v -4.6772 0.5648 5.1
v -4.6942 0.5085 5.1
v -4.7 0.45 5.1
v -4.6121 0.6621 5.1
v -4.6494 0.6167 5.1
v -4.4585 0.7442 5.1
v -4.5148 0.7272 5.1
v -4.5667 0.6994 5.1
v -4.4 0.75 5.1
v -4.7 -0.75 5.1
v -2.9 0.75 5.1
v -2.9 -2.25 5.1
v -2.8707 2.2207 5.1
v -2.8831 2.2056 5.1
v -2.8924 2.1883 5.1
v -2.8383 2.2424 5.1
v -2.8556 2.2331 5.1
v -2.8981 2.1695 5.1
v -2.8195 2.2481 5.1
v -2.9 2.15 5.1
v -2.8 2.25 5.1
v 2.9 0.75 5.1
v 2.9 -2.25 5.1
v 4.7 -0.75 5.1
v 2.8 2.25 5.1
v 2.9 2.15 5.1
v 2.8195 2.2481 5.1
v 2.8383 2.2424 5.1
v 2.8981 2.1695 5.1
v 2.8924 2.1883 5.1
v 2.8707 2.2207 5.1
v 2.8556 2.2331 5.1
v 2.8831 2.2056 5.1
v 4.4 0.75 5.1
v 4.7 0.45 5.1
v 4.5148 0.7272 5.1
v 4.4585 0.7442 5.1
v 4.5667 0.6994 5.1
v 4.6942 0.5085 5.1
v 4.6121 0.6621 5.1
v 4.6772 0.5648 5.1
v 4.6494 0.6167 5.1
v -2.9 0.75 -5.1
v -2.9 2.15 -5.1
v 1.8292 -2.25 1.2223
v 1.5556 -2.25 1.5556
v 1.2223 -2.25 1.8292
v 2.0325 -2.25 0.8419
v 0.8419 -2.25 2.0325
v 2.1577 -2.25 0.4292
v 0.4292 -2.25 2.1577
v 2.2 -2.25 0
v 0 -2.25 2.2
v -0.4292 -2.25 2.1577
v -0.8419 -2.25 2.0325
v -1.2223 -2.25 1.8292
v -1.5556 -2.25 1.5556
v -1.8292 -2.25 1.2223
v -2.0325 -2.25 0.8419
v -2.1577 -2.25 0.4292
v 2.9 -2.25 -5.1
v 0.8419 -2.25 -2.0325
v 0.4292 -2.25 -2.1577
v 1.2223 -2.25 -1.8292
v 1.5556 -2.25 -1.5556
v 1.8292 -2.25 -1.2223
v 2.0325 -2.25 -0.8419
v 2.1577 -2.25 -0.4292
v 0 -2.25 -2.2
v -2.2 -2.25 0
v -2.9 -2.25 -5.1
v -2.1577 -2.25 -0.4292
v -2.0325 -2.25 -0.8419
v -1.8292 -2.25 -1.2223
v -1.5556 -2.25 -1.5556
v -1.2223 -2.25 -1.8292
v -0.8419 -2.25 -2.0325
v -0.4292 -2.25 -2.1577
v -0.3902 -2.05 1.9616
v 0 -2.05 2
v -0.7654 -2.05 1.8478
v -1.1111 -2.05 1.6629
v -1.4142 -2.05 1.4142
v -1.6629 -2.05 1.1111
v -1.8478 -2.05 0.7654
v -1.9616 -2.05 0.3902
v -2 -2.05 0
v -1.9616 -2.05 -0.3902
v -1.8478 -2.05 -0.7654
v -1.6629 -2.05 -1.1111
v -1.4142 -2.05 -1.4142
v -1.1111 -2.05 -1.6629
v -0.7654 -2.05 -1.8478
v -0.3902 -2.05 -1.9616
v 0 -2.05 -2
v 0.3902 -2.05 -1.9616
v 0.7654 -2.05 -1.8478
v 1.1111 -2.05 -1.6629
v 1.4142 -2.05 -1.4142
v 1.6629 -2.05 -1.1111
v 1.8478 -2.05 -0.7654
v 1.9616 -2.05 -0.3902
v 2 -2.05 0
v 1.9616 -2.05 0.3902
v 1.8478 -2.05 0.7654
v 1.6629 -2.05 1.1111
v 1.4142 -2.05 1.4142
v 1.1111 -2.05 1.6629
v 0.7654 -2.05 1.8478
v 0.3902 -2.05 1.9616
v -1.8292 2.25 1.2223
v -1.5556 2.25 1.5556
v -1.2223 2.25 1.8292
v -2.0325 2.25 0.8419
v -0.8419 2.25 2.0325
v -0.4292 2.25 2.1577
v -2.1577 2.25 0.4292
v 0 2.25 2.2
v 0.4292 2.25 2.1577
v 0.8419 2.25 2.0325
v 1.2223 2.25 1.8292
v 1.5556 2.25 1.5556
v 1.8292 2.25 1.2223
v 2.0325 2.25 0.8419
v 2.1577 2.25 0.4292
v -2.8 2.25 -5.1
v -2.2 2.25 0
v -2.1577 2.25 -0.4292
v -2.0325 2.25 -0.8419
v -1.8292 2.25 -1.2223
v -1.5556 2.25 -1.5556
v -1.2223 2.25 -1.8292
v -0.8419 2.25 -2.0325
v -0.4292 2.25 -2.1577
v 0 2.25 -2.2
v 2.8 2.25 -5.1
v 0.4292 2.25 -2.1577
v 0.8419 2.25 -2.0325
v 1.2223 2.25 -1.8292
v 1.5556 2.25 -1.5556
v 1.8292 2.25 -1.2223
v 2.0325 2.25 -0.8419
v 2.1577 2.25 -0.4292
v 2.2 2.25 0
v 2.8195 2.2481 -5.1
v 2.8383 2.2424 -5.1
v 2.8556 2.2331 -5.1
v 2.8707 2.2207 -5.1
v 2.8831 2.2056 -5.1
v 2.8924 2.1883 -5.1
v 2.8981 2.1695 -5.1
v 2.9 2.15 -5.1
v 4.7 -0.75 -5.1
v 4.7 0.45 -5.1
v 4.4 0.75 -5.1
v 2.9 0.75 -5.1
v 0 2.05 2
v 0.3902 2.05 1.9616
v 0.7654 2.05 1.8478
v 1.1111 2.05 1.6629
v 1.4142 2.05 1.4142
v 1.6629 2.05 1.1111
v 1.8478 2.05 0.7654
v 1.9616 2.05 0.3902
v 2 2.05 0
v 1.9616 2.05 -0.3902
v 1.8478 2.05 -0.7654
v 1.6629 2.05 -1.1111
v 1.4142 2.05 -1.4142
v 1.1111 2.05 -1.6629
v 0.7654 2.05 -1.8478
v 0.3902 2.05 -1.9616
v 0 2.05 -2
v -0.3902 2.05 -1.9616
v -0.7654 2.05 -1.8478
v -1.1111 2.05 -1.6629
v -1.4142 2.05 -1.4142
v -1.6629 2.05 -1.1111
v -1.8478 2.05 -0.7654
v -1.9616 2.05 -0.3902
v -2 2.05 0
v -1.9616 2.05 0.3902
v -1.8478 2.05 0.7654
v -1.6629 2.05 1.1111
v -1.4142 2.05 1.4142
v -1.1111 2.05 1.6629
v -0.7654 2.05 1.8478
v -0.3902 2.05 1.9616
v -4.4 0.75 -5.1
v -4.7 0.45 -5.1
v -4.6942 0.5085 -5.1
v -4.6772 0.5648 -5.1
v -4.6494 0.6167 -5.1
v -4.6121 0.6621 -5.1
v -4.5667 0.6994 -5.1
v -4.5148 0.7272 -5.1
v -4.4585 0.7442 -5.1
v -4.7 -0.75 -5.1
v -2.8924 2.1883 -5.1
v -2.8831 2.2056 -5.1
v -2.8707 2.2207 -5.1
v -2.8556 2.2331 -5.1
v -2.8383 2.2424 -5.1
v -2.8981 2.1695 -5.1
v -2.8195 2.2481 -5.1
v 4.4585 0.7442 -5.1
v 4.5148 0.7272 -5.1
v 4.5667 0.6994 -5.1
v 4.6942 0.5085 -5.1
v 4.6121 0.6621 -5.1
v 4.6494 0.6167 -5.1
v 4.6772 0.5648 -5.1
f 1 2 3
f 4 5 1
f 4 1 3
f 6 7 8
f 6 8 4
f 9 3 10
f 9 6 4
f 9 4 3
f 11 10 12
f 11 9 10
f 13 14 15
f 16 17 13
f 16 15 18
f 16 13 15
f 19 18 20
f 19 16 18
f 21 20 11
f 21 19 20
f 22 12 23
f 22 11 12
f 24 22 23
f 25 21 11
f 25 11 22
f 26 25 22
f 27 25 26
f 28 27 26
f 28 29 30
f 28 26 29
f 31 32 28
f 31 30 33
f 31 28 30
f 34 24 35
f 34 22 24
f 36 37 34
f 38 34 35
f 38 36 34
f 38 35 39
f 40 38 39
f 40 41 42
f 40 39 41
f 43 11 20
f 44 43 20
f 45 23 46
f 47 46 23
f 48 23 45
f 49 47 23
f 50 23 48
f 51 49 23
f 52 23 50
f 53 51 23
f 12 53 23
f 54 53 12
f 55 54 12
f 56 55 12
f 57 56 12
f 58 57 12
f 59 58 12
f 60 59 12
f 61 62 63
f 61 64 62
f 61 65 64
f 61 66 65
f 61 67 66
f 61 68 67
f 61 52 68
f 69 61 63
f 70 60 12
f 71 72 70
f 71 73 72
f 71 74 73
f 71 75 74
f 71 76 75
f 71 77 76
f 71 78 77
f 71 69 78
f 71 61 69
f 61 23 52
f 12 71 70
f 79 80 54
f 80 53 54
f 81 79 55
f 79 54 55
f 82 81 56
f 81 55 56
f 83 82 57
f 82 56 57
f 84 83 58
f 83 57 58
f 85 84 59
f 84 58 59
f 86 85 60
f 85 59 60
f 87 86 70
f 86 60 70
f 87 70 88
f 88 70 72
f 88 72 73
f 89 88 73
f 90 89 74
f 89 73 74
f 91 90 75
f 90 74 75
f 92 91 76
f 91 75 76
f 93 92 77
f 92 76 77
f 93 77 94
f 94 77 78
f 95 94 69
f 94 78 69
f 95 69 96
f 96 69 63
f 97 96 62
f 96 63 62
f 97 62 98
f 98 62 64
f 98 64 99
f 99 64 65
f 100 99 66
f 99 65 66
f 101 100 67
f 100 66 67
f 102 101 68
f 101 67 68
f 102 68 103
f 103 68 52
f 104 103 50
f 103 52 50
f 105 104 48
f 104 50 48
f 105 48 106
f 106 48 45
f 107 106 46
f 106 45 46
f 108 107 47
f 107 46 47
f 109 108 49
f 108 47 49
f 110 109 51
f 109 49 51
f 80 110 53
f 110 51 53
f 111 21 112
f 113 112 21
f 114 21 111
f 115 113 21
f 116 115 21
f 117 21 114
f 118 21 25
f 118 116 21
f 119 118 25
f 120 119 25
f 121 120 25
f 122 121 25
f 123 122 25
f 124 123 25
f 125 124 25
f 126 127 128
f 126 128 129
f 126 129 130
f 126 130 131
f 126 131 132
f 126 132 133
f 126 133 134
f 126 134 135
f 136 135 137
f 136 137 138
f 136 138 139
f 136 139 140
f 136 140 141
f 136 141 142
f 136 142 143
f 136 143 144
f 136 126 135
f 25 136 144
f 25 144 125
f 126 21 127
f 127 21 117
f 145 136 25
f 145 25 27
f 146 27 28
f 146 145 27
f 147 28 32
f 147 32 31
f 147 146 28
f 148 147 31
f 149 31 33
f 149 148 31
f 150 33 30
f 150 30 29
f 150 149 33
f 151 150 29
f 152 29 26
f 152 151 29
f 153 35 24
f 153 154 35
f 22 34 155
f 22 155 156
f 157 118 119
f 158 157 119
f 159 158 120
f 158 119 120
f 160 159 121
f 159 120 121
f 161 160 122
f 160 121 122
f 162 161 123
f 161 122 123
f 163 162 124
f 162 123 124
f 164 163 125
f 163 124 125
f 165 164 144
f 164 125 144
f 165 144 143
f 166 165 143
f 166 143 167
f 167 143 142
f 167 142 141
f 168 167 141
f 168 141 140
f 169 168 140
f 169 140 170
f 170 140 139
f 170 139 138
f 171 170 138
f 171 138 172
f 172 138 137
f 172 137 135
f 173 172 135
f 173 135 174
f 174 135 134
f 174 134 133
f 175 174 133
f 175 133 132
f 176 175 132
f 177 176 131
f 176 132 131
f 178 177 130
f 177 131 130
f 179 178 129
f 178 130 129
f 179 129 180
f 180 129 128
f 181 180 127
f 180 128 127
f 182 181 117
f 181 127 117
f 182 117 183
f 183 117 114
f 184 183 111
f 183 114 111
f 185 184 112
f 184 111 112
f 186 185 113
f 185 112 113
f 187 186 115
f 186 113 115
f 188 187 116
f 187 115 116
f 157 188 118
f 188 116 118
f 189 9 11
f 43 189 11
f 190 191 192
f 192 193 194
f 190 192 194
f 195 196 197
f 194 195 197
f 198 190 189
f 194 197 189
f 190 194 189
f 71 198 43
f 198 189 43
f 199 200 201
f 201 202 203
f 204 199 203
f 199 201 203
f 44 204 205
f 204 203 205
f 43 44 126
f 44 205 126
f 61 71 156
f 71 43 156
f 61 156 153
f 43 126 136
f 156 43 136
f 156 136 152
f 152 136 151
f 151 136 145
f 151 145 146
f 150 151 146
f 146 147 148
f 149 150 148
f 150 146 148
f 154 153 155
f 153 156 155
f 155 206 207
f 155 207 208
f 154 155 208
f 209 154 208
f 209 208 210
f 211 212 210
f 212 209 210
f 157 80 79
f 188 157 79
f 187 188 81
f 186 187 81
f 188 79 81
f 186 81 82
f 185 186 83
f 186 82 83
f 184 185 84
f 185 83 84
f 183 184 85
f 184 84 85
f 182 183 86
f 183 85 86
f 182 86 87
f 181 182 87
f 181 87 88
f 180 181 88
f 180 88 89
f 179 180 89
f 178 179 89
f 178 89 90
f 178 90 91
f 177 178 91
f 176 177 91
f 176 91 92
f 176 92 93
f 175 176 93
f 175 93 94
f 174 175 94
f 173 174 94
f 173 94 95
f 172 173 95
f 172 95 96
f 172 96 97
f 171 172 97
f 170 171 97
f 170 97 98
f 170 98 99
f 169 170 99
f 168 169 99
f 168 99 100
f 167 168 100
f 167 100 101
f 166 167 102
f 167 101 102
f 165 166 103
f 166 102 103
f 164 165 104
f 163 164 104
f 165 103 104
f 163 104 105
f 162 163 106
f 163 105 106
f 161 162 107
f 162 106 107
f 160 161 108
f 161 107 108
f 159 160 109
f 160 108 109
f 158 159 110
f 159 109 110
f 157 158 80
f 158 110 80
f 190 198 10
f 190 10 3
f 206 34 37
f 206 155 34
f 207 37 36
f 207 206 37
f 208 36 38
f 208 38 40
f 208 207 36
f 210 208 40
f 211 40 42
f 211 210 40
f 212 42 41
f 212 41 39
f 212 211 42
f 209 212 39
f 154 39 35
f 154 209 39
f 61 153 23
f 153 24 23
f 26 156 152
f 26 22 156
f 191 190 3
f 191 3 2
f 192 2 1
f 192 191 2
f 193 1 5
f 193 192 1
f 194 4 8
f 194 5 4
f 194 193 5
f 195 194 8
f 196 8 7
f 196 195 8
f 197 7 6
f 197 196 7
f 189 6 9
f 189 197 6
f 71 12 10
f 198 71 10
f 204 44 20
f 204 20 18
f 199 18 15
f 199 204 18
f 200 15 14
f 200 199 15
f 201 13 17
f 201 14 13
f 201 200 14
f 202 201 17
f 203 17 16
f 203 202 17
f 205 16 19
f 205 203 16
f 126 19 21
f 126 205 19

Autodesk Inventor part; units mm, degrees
ref_plane "YZ Plane" through (0, 0, 0) normal (1, 0, 0) x (0, 1, 0)
ref_plane "XZ Plane" through (0, 0, 0) normal (0, 1, 0) x (-1, 0, 0)
ref_plane "XY Plane" through (0, 0, 0) normal (0, 0, 1) x (1, 0, 0)
sketch "Эскиз1" plane through (0, 0, 0) normal (0, 0, 1) x (1, 0, 0)
  line L0 (-4.7, 2.25) -> (4.7, 2.25)
  line L1 (4.7, 2.25) -> (4.7, -2.25)
  line L2 (4.7, -2.25) -> (-4.7, -2.25)
  line L3 (-4.7, -2.25) -> (-4.7, 2.25)
  point P0 (0, 0)
  point P1 (-4.7, 0)
  point P2 (0, 2.25)
  dimension "d0" = 9.4
  dimension "d1" = 4.5
extrude "Выдавливание1" add sketch "Эскиз1" along normal mid plane 10.2
sketch "Эскиз3" plane through (0, 0, 5.1) normal (0, 0, 1) x (1, 0, 0)
  line L0 (-4.7, 2.25) -> (-4.7, -2.25) projected
  line L1 (-4.7, 0.75) -> (-2.9, 0.75)
  line L2 (-2.9, 0.75) -> (-2.9, 2.25)
  line L3 (4.7, 2.25) -> (-4.7, 2.25) projected
  line L4 (4.7, -2.25) -> (4.7, 2.25) projected
  line L5 (4.7, 0.75) -> (2.9, 0.75)
  line L6 (2.9, 0.75) -> (2.9, 2.25)
  point P0 (0, 0)
  dimension "d7" = 1.5
  dimension "d8" = 2.9
  dimension "d9" = 5.8
extrude "Выдавливание2" cut sketch "Эскиз3" against normal blind 10.2
sketch "Эскиз5" plane through (0, 0, 5.1) normal (0, 0, 1) x (1, 0, 0)
  line L0 (-4.7, -2.25) -> (4.7, -2.25) projected
  line L1 (-2.9, -2.25) -> (-4.7, -0.75)
  line L2 (-4.7, 0.75) -> (-4.7, -2.25) projected
  line L3 (4.7, -2.25) -> (4.7, 0.75) projected
  line L4 (4.7, -0.75) -> (2.9, -2.25)
  point P0 (0, 0)
  dimension "d15" = 1.5
  dimension "d16" = 2.9
  dimension "d17" = 5.8
extrude "Выдавливание3" cut sketch "Эскиз5" against normal blind 10.2
sketch "Эскиз6" plane through (-2.9, 2.25, -5.1) normal (0, 1, 0) x (1, 0, 0)
  point P0 (2.9, -5.1)
  point P1 (2.9, -5.1)
hole "Отверстие1" at (0, 2.25, 0) direction (0, -1, 0) diameter 4 end through all
thread "Резьба1" size "M4x0.7" class "6H" standard "ANSI Metric M Profile" full length
chamfer "Фаска1" distance 0.2 angle 45 2 edges at (0, 2.25, -2) (0, -2.25, -2)
fillet "Сопряжение2" radius 0.1 2 edges at (2.9, 2.25, 0) (-2.9, 2.25, 0)
fillet "Сопряжение3" radius 0.3 2 edges at (-4.7, 0.75, 0) (4.7, 0.75, 0)
properties part number "COTS_GENERIC_20x20_M4_Nut" material "Сталь"
